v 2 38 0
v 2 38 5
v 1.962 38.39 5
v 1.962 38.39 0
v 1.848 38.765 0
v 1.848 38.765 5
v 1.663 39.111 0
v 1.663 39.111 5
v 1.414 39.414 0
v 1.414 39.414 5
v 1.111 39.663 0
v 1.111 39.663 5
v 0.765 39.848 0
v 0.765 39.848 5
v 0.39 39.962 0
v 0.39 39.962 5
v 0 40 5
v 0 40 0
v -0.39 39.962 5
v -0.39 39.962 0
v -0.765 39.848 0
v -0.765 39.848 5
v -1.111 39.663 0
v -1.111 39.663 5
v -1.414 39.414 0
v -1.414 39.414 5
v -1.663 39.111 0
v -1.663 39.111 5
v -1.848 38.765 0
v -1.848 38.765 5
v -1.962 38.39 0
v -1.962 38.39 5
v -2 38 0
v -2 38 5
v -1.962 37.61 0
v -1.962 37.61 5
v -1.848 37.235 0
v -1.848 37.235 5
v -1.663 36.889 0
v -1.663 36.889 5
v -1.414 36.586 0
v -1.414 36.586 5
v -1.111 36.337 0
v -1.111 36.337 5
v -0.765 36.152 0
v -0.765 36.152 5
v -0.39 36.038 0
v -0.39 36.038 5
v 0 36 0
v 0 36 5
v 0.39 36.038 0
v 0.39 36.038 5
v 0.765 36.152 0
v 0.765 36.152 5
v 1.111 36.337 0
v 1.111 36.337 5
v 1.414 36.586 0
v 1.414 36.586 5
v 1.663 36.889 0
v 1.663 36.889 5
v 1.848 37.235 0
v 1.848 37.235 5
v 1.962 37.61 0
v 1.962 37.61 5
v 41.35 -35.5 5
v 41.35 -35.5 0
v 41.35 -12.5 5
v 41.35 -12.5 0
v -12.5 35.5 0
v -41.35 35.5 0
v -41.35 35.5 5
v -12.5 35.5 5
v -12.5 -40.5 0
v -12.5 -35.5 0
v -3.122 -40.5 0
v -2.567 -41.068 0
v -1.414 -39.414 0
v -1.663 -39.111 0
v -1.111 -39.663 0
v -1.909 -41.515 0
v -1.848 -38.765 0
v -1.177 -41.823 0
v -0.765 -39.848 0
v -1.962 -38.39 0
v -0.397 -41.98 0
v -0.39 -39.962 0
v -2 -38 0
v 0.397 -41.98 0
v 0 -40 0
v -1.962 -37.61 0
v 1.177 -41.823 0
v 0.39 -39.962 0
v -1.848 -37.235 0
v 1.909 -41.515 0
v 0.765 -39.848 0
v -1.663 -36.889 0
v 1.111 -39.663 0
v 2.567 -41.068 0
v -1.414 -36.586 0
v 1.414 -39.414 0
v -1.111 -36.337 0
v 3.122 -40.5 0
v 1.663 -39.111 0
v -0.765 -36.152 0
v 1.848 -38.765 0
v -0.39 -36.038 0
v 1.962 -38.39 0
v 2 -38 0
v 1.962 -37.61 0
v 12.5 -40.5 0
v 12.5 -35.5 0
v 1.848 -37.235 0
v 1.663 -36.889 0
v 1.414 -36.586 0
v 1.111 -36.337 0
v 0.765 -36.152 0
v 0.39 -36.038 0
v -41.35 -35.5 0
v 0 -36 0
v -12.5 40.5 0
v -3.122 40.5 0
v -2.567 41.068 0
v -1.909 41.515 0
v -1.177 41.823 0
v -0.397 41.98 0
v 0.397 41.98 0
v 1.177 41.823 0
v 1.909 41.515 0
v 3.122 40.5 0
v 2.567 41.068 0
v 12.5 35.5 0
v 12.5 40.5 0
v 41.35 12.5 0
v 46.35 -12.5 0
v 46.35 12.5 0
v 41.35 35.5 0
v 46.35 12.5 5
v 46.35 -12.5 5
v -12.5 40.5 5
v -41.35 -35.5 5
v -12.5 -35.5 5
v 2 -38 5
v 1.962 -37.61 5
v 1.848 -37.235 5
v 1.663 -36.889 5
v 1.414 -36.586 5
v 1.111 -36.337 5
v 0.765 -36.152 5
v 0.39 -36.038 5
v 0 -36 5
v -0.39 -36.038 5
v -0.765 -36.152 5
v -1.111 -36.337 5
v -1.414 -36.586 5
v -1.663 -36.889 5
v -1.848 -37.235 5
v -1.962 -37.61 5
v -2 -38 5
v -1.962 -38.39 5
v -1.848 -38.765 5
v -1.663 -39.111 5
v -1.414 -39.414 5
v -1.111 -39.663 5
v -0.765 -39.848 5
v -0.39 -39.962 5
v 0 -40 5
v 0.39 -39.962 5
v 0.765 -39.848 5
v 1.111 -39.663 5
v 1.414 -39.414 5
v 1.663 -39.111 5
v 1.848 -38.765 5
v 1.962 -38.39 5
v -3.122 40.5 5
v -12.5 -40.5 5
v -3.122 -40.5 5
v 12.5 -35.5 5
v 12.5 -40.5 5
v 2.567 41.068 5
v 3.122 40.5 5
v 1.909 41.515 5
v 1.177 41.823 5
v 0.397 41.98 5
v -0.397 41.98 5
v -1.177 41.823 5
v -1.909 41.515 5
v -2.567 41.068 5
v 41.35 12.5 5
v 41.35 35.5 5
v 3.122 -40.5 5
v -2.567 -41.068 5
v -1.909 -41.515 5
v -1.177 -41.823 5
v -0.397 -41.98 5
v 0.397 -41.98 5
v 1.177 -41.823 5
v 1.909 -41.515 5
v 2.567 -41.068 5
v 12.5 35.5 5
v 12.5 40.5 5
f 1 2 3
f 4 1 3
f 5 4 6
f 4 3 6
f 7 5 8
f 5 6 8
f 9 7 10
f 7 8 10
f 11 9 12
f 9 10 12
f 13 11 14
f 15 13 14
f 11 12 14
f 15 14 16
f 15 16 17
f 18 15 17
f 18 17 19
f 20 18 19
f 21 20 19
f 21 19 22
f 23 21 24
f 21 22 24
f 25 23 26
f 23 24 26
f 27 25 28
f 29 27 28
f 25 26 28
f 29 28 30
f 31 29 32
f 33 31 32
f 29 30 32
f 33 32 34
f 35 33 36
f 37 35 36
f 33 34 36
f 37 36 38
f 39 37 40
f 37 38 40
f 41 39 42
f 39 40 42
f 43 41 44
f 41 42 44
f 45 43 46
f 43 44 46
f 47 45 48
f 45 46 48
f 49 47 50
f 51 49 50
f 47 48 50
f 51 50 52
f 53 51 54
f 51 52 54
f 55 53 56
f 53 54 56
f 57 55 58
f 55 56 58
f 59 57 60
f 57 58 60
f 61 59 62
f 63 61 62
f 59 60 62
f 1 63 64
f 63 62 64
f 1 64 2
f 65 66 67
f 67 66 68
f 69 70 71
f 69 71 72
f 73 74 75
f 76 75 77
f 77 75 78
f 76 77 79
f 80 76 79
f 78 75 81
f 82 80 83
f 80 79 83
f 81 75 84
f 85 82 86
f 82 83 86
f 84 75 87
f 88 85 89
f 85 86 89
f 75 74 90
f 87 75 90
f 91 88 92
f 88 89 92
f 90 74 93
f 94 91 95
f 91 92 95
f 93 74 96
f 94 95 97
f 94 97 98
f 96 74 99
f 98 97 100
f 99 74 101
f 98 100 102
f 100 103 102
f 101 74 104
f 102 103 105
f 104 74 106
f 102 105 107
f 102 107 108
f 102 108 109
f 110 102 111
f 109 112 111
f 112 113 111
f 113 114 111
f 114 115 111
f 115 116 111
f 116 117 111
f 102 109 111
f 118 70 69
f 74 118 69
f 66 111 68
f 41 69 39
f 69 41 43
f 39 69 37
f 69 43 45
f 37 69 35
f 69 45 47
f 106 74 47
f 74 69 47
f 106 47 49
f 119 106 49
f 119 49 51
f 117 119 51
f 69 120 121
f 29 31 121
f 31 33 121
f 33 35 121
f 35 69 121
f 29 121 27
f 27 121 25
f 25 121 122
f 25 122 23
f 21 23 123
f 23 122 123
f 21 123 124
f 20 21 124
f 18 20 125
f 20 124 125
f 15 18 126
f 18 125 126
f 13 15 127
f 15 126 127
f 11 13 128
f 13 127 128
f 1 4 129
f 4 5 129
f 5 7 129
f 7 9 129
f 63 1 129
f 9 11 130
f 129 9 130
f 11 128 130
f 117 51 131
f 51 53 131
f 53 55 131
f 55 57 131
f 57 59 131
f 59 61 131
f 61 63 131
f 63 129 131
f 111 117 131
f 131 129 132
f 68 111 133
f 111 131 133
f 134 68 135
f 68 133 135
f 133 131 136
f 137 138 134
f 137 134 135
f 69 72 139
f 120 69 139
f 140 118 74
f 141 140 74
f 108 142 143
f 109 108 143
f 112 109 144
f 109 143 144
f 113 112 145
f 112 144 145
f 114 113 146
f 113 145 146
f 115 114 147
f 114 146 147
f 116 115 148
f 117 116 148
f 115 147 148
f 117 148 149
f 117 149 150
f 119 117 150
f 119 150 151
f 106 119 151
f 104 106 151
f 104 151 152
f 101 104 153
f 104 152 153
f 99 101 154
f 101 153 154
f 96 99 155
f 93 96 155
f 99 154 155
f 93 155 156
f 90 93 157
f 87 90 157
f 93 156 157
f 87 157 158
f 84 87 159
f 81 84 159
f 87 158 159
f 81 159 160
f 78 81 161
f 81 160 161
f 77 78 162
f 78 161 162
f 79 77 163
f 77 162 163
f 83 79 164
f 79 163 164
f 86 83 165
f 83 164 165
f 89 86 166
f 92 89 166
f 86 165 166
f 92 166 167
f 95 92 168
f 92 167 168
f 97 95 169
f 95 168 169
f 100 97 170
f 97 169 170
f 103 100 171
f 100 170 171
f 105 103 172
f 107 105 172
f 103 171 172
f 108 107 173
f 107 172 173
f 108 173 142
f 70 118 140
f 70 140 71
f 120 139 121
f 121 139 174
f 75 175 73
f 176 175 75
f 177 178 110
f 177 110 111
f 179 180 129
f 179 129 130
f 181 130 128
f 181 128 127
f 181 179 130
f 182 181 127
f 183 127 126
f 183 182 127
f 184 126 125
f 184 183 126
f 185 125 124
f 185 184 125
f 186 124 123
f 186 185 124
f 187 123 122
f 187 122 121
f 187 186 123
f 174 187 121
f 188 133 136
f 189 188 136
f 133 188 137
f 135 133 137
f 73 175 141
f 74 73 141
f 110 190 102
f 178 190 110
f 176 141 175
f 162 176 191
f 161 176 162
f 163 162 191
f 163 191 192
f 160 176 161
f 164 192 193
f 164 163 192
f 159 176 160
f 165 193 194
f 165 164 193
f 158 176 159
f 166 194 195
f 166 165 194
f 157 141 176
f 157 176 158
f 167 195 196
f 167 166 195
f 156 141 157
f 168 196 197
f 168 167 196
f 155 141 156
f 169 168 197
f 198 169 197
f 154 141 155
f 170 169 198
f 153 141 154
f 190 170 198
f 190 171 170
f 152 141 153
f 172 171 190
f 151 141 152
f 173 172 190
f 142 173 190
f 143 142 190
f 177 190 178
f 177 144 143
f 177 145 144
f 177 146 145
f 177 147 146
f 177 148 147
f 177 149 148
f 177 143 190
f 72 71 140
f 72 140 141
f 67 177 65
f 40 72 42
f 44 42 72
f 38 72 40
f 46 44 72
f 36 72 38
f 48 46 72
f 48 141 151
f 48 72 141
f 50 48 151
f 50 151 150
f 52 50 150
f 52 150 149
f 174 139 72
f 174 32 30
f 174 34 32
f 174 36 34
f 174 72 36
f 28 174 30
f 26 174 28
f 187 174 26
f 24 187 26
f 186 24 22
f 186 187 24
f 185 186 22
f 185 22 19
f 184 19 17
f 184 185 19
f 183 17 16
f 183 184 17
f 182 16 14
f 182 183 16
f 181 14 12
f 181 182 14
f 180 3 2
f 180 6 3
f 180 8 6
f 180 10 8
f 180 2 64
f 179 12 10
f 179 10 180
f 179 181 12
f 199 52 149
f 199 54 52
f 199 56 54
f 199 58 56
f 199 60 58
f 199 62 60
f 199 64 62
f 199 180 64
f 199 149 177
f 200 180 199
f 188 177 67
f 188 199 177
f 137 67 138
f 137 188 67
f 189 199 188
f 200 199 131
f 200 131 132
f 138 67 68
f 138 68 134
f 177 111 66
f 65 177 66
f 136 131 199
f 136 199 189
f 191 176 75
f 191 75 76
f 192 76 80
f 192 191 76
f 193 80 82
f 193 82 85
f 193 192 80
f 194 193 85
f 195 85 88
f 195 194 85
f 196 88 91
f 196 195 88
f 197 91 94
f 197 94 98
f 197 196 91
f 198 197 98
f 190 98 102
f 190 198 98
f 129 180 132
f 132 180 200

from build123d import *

# Parameters (mm, degrees)
SKETCH1_W           = 82.7
SKETCH1_H           = 71
BOSS_EXTRUDE1_DEPTH = 5
SKETCH3_W           = 25
SKETCH3_H           = 5
SKETCH3_W_2         = 5
SKETCH3_H_2         = 25
BOSS_EXTRUDE2_DEPTH = 5
SKETCH4_R           = 2
CUT_EXTRUDE1_DEPTH  = 5
SKETCH5_R           = 4
SKETCH5_R_2         = 2
BOSS_EXTRUDE3_DEPTH = 5


with BuildPart() as part:
    # Sketch1 → Boss-Extrude1 (new body)
    with BuildSketch(Plane.XY):
        Rectangle(SKETCH1_W, SKETCH1_H)
    extrude(amount=BOSS_EXTRUDE1_DEPTH)

    # Sketch3 → Boss-Extrude2 (add)
    with BuildSketch(Plane.XY.offset(5)):
        with Locations((0, 38)):
            Rectangle(SKETCH3_W, SKETCH3_H)
        with Locations((43.85, 0)):
            Rectangle(SKETCH3_W_2, SKETCH3_H_2)
        with Locations((0, -38)):
            Rectangle(SKETCH3_W, SKETCH3_H)
    extrude(amount=-BOSS_EXTRUDE2_DEPTH)

    # Sketch4 → Cut-Extrude1 (cut)
    with BuildSketch(Plane.XY.offset(5)):
        with Locations((0, 38)):
            Circle(SKETCH4_R)
        with Locations((0, -38)):
            Circle(SKETCH4_R)
    extrude(amount=-CUT_EXTRUDE1_DEPTH, mode=Mode.SUBTRACT)

    # Sketch5 → Boss-Extrude3 (add)
    # profile 1 of 2: a face of its own
    with BuildSketch(Plane.XY.offset(5)):
        with Locations((0, 38)):
            Circle(SKETCH5_R)
        with Locations((0, 38)):
            Circle(SKETCH5_R_2, mode=Mode.SUBTRACT)
    # profile 2 of 2: a face of its own
    with BuildSketch(Plane.XY.offset(5)):
        with Locations((0, -38)):
            Circle(SKETCH5_R)
        with Locations((0, -38)):
            Circle(SKETCH5_R_2, mode=Mode.SUBTRACT)
    extrude(amount=-BOSS_EXTRUDE3_DEPTH)


solid = part.part
